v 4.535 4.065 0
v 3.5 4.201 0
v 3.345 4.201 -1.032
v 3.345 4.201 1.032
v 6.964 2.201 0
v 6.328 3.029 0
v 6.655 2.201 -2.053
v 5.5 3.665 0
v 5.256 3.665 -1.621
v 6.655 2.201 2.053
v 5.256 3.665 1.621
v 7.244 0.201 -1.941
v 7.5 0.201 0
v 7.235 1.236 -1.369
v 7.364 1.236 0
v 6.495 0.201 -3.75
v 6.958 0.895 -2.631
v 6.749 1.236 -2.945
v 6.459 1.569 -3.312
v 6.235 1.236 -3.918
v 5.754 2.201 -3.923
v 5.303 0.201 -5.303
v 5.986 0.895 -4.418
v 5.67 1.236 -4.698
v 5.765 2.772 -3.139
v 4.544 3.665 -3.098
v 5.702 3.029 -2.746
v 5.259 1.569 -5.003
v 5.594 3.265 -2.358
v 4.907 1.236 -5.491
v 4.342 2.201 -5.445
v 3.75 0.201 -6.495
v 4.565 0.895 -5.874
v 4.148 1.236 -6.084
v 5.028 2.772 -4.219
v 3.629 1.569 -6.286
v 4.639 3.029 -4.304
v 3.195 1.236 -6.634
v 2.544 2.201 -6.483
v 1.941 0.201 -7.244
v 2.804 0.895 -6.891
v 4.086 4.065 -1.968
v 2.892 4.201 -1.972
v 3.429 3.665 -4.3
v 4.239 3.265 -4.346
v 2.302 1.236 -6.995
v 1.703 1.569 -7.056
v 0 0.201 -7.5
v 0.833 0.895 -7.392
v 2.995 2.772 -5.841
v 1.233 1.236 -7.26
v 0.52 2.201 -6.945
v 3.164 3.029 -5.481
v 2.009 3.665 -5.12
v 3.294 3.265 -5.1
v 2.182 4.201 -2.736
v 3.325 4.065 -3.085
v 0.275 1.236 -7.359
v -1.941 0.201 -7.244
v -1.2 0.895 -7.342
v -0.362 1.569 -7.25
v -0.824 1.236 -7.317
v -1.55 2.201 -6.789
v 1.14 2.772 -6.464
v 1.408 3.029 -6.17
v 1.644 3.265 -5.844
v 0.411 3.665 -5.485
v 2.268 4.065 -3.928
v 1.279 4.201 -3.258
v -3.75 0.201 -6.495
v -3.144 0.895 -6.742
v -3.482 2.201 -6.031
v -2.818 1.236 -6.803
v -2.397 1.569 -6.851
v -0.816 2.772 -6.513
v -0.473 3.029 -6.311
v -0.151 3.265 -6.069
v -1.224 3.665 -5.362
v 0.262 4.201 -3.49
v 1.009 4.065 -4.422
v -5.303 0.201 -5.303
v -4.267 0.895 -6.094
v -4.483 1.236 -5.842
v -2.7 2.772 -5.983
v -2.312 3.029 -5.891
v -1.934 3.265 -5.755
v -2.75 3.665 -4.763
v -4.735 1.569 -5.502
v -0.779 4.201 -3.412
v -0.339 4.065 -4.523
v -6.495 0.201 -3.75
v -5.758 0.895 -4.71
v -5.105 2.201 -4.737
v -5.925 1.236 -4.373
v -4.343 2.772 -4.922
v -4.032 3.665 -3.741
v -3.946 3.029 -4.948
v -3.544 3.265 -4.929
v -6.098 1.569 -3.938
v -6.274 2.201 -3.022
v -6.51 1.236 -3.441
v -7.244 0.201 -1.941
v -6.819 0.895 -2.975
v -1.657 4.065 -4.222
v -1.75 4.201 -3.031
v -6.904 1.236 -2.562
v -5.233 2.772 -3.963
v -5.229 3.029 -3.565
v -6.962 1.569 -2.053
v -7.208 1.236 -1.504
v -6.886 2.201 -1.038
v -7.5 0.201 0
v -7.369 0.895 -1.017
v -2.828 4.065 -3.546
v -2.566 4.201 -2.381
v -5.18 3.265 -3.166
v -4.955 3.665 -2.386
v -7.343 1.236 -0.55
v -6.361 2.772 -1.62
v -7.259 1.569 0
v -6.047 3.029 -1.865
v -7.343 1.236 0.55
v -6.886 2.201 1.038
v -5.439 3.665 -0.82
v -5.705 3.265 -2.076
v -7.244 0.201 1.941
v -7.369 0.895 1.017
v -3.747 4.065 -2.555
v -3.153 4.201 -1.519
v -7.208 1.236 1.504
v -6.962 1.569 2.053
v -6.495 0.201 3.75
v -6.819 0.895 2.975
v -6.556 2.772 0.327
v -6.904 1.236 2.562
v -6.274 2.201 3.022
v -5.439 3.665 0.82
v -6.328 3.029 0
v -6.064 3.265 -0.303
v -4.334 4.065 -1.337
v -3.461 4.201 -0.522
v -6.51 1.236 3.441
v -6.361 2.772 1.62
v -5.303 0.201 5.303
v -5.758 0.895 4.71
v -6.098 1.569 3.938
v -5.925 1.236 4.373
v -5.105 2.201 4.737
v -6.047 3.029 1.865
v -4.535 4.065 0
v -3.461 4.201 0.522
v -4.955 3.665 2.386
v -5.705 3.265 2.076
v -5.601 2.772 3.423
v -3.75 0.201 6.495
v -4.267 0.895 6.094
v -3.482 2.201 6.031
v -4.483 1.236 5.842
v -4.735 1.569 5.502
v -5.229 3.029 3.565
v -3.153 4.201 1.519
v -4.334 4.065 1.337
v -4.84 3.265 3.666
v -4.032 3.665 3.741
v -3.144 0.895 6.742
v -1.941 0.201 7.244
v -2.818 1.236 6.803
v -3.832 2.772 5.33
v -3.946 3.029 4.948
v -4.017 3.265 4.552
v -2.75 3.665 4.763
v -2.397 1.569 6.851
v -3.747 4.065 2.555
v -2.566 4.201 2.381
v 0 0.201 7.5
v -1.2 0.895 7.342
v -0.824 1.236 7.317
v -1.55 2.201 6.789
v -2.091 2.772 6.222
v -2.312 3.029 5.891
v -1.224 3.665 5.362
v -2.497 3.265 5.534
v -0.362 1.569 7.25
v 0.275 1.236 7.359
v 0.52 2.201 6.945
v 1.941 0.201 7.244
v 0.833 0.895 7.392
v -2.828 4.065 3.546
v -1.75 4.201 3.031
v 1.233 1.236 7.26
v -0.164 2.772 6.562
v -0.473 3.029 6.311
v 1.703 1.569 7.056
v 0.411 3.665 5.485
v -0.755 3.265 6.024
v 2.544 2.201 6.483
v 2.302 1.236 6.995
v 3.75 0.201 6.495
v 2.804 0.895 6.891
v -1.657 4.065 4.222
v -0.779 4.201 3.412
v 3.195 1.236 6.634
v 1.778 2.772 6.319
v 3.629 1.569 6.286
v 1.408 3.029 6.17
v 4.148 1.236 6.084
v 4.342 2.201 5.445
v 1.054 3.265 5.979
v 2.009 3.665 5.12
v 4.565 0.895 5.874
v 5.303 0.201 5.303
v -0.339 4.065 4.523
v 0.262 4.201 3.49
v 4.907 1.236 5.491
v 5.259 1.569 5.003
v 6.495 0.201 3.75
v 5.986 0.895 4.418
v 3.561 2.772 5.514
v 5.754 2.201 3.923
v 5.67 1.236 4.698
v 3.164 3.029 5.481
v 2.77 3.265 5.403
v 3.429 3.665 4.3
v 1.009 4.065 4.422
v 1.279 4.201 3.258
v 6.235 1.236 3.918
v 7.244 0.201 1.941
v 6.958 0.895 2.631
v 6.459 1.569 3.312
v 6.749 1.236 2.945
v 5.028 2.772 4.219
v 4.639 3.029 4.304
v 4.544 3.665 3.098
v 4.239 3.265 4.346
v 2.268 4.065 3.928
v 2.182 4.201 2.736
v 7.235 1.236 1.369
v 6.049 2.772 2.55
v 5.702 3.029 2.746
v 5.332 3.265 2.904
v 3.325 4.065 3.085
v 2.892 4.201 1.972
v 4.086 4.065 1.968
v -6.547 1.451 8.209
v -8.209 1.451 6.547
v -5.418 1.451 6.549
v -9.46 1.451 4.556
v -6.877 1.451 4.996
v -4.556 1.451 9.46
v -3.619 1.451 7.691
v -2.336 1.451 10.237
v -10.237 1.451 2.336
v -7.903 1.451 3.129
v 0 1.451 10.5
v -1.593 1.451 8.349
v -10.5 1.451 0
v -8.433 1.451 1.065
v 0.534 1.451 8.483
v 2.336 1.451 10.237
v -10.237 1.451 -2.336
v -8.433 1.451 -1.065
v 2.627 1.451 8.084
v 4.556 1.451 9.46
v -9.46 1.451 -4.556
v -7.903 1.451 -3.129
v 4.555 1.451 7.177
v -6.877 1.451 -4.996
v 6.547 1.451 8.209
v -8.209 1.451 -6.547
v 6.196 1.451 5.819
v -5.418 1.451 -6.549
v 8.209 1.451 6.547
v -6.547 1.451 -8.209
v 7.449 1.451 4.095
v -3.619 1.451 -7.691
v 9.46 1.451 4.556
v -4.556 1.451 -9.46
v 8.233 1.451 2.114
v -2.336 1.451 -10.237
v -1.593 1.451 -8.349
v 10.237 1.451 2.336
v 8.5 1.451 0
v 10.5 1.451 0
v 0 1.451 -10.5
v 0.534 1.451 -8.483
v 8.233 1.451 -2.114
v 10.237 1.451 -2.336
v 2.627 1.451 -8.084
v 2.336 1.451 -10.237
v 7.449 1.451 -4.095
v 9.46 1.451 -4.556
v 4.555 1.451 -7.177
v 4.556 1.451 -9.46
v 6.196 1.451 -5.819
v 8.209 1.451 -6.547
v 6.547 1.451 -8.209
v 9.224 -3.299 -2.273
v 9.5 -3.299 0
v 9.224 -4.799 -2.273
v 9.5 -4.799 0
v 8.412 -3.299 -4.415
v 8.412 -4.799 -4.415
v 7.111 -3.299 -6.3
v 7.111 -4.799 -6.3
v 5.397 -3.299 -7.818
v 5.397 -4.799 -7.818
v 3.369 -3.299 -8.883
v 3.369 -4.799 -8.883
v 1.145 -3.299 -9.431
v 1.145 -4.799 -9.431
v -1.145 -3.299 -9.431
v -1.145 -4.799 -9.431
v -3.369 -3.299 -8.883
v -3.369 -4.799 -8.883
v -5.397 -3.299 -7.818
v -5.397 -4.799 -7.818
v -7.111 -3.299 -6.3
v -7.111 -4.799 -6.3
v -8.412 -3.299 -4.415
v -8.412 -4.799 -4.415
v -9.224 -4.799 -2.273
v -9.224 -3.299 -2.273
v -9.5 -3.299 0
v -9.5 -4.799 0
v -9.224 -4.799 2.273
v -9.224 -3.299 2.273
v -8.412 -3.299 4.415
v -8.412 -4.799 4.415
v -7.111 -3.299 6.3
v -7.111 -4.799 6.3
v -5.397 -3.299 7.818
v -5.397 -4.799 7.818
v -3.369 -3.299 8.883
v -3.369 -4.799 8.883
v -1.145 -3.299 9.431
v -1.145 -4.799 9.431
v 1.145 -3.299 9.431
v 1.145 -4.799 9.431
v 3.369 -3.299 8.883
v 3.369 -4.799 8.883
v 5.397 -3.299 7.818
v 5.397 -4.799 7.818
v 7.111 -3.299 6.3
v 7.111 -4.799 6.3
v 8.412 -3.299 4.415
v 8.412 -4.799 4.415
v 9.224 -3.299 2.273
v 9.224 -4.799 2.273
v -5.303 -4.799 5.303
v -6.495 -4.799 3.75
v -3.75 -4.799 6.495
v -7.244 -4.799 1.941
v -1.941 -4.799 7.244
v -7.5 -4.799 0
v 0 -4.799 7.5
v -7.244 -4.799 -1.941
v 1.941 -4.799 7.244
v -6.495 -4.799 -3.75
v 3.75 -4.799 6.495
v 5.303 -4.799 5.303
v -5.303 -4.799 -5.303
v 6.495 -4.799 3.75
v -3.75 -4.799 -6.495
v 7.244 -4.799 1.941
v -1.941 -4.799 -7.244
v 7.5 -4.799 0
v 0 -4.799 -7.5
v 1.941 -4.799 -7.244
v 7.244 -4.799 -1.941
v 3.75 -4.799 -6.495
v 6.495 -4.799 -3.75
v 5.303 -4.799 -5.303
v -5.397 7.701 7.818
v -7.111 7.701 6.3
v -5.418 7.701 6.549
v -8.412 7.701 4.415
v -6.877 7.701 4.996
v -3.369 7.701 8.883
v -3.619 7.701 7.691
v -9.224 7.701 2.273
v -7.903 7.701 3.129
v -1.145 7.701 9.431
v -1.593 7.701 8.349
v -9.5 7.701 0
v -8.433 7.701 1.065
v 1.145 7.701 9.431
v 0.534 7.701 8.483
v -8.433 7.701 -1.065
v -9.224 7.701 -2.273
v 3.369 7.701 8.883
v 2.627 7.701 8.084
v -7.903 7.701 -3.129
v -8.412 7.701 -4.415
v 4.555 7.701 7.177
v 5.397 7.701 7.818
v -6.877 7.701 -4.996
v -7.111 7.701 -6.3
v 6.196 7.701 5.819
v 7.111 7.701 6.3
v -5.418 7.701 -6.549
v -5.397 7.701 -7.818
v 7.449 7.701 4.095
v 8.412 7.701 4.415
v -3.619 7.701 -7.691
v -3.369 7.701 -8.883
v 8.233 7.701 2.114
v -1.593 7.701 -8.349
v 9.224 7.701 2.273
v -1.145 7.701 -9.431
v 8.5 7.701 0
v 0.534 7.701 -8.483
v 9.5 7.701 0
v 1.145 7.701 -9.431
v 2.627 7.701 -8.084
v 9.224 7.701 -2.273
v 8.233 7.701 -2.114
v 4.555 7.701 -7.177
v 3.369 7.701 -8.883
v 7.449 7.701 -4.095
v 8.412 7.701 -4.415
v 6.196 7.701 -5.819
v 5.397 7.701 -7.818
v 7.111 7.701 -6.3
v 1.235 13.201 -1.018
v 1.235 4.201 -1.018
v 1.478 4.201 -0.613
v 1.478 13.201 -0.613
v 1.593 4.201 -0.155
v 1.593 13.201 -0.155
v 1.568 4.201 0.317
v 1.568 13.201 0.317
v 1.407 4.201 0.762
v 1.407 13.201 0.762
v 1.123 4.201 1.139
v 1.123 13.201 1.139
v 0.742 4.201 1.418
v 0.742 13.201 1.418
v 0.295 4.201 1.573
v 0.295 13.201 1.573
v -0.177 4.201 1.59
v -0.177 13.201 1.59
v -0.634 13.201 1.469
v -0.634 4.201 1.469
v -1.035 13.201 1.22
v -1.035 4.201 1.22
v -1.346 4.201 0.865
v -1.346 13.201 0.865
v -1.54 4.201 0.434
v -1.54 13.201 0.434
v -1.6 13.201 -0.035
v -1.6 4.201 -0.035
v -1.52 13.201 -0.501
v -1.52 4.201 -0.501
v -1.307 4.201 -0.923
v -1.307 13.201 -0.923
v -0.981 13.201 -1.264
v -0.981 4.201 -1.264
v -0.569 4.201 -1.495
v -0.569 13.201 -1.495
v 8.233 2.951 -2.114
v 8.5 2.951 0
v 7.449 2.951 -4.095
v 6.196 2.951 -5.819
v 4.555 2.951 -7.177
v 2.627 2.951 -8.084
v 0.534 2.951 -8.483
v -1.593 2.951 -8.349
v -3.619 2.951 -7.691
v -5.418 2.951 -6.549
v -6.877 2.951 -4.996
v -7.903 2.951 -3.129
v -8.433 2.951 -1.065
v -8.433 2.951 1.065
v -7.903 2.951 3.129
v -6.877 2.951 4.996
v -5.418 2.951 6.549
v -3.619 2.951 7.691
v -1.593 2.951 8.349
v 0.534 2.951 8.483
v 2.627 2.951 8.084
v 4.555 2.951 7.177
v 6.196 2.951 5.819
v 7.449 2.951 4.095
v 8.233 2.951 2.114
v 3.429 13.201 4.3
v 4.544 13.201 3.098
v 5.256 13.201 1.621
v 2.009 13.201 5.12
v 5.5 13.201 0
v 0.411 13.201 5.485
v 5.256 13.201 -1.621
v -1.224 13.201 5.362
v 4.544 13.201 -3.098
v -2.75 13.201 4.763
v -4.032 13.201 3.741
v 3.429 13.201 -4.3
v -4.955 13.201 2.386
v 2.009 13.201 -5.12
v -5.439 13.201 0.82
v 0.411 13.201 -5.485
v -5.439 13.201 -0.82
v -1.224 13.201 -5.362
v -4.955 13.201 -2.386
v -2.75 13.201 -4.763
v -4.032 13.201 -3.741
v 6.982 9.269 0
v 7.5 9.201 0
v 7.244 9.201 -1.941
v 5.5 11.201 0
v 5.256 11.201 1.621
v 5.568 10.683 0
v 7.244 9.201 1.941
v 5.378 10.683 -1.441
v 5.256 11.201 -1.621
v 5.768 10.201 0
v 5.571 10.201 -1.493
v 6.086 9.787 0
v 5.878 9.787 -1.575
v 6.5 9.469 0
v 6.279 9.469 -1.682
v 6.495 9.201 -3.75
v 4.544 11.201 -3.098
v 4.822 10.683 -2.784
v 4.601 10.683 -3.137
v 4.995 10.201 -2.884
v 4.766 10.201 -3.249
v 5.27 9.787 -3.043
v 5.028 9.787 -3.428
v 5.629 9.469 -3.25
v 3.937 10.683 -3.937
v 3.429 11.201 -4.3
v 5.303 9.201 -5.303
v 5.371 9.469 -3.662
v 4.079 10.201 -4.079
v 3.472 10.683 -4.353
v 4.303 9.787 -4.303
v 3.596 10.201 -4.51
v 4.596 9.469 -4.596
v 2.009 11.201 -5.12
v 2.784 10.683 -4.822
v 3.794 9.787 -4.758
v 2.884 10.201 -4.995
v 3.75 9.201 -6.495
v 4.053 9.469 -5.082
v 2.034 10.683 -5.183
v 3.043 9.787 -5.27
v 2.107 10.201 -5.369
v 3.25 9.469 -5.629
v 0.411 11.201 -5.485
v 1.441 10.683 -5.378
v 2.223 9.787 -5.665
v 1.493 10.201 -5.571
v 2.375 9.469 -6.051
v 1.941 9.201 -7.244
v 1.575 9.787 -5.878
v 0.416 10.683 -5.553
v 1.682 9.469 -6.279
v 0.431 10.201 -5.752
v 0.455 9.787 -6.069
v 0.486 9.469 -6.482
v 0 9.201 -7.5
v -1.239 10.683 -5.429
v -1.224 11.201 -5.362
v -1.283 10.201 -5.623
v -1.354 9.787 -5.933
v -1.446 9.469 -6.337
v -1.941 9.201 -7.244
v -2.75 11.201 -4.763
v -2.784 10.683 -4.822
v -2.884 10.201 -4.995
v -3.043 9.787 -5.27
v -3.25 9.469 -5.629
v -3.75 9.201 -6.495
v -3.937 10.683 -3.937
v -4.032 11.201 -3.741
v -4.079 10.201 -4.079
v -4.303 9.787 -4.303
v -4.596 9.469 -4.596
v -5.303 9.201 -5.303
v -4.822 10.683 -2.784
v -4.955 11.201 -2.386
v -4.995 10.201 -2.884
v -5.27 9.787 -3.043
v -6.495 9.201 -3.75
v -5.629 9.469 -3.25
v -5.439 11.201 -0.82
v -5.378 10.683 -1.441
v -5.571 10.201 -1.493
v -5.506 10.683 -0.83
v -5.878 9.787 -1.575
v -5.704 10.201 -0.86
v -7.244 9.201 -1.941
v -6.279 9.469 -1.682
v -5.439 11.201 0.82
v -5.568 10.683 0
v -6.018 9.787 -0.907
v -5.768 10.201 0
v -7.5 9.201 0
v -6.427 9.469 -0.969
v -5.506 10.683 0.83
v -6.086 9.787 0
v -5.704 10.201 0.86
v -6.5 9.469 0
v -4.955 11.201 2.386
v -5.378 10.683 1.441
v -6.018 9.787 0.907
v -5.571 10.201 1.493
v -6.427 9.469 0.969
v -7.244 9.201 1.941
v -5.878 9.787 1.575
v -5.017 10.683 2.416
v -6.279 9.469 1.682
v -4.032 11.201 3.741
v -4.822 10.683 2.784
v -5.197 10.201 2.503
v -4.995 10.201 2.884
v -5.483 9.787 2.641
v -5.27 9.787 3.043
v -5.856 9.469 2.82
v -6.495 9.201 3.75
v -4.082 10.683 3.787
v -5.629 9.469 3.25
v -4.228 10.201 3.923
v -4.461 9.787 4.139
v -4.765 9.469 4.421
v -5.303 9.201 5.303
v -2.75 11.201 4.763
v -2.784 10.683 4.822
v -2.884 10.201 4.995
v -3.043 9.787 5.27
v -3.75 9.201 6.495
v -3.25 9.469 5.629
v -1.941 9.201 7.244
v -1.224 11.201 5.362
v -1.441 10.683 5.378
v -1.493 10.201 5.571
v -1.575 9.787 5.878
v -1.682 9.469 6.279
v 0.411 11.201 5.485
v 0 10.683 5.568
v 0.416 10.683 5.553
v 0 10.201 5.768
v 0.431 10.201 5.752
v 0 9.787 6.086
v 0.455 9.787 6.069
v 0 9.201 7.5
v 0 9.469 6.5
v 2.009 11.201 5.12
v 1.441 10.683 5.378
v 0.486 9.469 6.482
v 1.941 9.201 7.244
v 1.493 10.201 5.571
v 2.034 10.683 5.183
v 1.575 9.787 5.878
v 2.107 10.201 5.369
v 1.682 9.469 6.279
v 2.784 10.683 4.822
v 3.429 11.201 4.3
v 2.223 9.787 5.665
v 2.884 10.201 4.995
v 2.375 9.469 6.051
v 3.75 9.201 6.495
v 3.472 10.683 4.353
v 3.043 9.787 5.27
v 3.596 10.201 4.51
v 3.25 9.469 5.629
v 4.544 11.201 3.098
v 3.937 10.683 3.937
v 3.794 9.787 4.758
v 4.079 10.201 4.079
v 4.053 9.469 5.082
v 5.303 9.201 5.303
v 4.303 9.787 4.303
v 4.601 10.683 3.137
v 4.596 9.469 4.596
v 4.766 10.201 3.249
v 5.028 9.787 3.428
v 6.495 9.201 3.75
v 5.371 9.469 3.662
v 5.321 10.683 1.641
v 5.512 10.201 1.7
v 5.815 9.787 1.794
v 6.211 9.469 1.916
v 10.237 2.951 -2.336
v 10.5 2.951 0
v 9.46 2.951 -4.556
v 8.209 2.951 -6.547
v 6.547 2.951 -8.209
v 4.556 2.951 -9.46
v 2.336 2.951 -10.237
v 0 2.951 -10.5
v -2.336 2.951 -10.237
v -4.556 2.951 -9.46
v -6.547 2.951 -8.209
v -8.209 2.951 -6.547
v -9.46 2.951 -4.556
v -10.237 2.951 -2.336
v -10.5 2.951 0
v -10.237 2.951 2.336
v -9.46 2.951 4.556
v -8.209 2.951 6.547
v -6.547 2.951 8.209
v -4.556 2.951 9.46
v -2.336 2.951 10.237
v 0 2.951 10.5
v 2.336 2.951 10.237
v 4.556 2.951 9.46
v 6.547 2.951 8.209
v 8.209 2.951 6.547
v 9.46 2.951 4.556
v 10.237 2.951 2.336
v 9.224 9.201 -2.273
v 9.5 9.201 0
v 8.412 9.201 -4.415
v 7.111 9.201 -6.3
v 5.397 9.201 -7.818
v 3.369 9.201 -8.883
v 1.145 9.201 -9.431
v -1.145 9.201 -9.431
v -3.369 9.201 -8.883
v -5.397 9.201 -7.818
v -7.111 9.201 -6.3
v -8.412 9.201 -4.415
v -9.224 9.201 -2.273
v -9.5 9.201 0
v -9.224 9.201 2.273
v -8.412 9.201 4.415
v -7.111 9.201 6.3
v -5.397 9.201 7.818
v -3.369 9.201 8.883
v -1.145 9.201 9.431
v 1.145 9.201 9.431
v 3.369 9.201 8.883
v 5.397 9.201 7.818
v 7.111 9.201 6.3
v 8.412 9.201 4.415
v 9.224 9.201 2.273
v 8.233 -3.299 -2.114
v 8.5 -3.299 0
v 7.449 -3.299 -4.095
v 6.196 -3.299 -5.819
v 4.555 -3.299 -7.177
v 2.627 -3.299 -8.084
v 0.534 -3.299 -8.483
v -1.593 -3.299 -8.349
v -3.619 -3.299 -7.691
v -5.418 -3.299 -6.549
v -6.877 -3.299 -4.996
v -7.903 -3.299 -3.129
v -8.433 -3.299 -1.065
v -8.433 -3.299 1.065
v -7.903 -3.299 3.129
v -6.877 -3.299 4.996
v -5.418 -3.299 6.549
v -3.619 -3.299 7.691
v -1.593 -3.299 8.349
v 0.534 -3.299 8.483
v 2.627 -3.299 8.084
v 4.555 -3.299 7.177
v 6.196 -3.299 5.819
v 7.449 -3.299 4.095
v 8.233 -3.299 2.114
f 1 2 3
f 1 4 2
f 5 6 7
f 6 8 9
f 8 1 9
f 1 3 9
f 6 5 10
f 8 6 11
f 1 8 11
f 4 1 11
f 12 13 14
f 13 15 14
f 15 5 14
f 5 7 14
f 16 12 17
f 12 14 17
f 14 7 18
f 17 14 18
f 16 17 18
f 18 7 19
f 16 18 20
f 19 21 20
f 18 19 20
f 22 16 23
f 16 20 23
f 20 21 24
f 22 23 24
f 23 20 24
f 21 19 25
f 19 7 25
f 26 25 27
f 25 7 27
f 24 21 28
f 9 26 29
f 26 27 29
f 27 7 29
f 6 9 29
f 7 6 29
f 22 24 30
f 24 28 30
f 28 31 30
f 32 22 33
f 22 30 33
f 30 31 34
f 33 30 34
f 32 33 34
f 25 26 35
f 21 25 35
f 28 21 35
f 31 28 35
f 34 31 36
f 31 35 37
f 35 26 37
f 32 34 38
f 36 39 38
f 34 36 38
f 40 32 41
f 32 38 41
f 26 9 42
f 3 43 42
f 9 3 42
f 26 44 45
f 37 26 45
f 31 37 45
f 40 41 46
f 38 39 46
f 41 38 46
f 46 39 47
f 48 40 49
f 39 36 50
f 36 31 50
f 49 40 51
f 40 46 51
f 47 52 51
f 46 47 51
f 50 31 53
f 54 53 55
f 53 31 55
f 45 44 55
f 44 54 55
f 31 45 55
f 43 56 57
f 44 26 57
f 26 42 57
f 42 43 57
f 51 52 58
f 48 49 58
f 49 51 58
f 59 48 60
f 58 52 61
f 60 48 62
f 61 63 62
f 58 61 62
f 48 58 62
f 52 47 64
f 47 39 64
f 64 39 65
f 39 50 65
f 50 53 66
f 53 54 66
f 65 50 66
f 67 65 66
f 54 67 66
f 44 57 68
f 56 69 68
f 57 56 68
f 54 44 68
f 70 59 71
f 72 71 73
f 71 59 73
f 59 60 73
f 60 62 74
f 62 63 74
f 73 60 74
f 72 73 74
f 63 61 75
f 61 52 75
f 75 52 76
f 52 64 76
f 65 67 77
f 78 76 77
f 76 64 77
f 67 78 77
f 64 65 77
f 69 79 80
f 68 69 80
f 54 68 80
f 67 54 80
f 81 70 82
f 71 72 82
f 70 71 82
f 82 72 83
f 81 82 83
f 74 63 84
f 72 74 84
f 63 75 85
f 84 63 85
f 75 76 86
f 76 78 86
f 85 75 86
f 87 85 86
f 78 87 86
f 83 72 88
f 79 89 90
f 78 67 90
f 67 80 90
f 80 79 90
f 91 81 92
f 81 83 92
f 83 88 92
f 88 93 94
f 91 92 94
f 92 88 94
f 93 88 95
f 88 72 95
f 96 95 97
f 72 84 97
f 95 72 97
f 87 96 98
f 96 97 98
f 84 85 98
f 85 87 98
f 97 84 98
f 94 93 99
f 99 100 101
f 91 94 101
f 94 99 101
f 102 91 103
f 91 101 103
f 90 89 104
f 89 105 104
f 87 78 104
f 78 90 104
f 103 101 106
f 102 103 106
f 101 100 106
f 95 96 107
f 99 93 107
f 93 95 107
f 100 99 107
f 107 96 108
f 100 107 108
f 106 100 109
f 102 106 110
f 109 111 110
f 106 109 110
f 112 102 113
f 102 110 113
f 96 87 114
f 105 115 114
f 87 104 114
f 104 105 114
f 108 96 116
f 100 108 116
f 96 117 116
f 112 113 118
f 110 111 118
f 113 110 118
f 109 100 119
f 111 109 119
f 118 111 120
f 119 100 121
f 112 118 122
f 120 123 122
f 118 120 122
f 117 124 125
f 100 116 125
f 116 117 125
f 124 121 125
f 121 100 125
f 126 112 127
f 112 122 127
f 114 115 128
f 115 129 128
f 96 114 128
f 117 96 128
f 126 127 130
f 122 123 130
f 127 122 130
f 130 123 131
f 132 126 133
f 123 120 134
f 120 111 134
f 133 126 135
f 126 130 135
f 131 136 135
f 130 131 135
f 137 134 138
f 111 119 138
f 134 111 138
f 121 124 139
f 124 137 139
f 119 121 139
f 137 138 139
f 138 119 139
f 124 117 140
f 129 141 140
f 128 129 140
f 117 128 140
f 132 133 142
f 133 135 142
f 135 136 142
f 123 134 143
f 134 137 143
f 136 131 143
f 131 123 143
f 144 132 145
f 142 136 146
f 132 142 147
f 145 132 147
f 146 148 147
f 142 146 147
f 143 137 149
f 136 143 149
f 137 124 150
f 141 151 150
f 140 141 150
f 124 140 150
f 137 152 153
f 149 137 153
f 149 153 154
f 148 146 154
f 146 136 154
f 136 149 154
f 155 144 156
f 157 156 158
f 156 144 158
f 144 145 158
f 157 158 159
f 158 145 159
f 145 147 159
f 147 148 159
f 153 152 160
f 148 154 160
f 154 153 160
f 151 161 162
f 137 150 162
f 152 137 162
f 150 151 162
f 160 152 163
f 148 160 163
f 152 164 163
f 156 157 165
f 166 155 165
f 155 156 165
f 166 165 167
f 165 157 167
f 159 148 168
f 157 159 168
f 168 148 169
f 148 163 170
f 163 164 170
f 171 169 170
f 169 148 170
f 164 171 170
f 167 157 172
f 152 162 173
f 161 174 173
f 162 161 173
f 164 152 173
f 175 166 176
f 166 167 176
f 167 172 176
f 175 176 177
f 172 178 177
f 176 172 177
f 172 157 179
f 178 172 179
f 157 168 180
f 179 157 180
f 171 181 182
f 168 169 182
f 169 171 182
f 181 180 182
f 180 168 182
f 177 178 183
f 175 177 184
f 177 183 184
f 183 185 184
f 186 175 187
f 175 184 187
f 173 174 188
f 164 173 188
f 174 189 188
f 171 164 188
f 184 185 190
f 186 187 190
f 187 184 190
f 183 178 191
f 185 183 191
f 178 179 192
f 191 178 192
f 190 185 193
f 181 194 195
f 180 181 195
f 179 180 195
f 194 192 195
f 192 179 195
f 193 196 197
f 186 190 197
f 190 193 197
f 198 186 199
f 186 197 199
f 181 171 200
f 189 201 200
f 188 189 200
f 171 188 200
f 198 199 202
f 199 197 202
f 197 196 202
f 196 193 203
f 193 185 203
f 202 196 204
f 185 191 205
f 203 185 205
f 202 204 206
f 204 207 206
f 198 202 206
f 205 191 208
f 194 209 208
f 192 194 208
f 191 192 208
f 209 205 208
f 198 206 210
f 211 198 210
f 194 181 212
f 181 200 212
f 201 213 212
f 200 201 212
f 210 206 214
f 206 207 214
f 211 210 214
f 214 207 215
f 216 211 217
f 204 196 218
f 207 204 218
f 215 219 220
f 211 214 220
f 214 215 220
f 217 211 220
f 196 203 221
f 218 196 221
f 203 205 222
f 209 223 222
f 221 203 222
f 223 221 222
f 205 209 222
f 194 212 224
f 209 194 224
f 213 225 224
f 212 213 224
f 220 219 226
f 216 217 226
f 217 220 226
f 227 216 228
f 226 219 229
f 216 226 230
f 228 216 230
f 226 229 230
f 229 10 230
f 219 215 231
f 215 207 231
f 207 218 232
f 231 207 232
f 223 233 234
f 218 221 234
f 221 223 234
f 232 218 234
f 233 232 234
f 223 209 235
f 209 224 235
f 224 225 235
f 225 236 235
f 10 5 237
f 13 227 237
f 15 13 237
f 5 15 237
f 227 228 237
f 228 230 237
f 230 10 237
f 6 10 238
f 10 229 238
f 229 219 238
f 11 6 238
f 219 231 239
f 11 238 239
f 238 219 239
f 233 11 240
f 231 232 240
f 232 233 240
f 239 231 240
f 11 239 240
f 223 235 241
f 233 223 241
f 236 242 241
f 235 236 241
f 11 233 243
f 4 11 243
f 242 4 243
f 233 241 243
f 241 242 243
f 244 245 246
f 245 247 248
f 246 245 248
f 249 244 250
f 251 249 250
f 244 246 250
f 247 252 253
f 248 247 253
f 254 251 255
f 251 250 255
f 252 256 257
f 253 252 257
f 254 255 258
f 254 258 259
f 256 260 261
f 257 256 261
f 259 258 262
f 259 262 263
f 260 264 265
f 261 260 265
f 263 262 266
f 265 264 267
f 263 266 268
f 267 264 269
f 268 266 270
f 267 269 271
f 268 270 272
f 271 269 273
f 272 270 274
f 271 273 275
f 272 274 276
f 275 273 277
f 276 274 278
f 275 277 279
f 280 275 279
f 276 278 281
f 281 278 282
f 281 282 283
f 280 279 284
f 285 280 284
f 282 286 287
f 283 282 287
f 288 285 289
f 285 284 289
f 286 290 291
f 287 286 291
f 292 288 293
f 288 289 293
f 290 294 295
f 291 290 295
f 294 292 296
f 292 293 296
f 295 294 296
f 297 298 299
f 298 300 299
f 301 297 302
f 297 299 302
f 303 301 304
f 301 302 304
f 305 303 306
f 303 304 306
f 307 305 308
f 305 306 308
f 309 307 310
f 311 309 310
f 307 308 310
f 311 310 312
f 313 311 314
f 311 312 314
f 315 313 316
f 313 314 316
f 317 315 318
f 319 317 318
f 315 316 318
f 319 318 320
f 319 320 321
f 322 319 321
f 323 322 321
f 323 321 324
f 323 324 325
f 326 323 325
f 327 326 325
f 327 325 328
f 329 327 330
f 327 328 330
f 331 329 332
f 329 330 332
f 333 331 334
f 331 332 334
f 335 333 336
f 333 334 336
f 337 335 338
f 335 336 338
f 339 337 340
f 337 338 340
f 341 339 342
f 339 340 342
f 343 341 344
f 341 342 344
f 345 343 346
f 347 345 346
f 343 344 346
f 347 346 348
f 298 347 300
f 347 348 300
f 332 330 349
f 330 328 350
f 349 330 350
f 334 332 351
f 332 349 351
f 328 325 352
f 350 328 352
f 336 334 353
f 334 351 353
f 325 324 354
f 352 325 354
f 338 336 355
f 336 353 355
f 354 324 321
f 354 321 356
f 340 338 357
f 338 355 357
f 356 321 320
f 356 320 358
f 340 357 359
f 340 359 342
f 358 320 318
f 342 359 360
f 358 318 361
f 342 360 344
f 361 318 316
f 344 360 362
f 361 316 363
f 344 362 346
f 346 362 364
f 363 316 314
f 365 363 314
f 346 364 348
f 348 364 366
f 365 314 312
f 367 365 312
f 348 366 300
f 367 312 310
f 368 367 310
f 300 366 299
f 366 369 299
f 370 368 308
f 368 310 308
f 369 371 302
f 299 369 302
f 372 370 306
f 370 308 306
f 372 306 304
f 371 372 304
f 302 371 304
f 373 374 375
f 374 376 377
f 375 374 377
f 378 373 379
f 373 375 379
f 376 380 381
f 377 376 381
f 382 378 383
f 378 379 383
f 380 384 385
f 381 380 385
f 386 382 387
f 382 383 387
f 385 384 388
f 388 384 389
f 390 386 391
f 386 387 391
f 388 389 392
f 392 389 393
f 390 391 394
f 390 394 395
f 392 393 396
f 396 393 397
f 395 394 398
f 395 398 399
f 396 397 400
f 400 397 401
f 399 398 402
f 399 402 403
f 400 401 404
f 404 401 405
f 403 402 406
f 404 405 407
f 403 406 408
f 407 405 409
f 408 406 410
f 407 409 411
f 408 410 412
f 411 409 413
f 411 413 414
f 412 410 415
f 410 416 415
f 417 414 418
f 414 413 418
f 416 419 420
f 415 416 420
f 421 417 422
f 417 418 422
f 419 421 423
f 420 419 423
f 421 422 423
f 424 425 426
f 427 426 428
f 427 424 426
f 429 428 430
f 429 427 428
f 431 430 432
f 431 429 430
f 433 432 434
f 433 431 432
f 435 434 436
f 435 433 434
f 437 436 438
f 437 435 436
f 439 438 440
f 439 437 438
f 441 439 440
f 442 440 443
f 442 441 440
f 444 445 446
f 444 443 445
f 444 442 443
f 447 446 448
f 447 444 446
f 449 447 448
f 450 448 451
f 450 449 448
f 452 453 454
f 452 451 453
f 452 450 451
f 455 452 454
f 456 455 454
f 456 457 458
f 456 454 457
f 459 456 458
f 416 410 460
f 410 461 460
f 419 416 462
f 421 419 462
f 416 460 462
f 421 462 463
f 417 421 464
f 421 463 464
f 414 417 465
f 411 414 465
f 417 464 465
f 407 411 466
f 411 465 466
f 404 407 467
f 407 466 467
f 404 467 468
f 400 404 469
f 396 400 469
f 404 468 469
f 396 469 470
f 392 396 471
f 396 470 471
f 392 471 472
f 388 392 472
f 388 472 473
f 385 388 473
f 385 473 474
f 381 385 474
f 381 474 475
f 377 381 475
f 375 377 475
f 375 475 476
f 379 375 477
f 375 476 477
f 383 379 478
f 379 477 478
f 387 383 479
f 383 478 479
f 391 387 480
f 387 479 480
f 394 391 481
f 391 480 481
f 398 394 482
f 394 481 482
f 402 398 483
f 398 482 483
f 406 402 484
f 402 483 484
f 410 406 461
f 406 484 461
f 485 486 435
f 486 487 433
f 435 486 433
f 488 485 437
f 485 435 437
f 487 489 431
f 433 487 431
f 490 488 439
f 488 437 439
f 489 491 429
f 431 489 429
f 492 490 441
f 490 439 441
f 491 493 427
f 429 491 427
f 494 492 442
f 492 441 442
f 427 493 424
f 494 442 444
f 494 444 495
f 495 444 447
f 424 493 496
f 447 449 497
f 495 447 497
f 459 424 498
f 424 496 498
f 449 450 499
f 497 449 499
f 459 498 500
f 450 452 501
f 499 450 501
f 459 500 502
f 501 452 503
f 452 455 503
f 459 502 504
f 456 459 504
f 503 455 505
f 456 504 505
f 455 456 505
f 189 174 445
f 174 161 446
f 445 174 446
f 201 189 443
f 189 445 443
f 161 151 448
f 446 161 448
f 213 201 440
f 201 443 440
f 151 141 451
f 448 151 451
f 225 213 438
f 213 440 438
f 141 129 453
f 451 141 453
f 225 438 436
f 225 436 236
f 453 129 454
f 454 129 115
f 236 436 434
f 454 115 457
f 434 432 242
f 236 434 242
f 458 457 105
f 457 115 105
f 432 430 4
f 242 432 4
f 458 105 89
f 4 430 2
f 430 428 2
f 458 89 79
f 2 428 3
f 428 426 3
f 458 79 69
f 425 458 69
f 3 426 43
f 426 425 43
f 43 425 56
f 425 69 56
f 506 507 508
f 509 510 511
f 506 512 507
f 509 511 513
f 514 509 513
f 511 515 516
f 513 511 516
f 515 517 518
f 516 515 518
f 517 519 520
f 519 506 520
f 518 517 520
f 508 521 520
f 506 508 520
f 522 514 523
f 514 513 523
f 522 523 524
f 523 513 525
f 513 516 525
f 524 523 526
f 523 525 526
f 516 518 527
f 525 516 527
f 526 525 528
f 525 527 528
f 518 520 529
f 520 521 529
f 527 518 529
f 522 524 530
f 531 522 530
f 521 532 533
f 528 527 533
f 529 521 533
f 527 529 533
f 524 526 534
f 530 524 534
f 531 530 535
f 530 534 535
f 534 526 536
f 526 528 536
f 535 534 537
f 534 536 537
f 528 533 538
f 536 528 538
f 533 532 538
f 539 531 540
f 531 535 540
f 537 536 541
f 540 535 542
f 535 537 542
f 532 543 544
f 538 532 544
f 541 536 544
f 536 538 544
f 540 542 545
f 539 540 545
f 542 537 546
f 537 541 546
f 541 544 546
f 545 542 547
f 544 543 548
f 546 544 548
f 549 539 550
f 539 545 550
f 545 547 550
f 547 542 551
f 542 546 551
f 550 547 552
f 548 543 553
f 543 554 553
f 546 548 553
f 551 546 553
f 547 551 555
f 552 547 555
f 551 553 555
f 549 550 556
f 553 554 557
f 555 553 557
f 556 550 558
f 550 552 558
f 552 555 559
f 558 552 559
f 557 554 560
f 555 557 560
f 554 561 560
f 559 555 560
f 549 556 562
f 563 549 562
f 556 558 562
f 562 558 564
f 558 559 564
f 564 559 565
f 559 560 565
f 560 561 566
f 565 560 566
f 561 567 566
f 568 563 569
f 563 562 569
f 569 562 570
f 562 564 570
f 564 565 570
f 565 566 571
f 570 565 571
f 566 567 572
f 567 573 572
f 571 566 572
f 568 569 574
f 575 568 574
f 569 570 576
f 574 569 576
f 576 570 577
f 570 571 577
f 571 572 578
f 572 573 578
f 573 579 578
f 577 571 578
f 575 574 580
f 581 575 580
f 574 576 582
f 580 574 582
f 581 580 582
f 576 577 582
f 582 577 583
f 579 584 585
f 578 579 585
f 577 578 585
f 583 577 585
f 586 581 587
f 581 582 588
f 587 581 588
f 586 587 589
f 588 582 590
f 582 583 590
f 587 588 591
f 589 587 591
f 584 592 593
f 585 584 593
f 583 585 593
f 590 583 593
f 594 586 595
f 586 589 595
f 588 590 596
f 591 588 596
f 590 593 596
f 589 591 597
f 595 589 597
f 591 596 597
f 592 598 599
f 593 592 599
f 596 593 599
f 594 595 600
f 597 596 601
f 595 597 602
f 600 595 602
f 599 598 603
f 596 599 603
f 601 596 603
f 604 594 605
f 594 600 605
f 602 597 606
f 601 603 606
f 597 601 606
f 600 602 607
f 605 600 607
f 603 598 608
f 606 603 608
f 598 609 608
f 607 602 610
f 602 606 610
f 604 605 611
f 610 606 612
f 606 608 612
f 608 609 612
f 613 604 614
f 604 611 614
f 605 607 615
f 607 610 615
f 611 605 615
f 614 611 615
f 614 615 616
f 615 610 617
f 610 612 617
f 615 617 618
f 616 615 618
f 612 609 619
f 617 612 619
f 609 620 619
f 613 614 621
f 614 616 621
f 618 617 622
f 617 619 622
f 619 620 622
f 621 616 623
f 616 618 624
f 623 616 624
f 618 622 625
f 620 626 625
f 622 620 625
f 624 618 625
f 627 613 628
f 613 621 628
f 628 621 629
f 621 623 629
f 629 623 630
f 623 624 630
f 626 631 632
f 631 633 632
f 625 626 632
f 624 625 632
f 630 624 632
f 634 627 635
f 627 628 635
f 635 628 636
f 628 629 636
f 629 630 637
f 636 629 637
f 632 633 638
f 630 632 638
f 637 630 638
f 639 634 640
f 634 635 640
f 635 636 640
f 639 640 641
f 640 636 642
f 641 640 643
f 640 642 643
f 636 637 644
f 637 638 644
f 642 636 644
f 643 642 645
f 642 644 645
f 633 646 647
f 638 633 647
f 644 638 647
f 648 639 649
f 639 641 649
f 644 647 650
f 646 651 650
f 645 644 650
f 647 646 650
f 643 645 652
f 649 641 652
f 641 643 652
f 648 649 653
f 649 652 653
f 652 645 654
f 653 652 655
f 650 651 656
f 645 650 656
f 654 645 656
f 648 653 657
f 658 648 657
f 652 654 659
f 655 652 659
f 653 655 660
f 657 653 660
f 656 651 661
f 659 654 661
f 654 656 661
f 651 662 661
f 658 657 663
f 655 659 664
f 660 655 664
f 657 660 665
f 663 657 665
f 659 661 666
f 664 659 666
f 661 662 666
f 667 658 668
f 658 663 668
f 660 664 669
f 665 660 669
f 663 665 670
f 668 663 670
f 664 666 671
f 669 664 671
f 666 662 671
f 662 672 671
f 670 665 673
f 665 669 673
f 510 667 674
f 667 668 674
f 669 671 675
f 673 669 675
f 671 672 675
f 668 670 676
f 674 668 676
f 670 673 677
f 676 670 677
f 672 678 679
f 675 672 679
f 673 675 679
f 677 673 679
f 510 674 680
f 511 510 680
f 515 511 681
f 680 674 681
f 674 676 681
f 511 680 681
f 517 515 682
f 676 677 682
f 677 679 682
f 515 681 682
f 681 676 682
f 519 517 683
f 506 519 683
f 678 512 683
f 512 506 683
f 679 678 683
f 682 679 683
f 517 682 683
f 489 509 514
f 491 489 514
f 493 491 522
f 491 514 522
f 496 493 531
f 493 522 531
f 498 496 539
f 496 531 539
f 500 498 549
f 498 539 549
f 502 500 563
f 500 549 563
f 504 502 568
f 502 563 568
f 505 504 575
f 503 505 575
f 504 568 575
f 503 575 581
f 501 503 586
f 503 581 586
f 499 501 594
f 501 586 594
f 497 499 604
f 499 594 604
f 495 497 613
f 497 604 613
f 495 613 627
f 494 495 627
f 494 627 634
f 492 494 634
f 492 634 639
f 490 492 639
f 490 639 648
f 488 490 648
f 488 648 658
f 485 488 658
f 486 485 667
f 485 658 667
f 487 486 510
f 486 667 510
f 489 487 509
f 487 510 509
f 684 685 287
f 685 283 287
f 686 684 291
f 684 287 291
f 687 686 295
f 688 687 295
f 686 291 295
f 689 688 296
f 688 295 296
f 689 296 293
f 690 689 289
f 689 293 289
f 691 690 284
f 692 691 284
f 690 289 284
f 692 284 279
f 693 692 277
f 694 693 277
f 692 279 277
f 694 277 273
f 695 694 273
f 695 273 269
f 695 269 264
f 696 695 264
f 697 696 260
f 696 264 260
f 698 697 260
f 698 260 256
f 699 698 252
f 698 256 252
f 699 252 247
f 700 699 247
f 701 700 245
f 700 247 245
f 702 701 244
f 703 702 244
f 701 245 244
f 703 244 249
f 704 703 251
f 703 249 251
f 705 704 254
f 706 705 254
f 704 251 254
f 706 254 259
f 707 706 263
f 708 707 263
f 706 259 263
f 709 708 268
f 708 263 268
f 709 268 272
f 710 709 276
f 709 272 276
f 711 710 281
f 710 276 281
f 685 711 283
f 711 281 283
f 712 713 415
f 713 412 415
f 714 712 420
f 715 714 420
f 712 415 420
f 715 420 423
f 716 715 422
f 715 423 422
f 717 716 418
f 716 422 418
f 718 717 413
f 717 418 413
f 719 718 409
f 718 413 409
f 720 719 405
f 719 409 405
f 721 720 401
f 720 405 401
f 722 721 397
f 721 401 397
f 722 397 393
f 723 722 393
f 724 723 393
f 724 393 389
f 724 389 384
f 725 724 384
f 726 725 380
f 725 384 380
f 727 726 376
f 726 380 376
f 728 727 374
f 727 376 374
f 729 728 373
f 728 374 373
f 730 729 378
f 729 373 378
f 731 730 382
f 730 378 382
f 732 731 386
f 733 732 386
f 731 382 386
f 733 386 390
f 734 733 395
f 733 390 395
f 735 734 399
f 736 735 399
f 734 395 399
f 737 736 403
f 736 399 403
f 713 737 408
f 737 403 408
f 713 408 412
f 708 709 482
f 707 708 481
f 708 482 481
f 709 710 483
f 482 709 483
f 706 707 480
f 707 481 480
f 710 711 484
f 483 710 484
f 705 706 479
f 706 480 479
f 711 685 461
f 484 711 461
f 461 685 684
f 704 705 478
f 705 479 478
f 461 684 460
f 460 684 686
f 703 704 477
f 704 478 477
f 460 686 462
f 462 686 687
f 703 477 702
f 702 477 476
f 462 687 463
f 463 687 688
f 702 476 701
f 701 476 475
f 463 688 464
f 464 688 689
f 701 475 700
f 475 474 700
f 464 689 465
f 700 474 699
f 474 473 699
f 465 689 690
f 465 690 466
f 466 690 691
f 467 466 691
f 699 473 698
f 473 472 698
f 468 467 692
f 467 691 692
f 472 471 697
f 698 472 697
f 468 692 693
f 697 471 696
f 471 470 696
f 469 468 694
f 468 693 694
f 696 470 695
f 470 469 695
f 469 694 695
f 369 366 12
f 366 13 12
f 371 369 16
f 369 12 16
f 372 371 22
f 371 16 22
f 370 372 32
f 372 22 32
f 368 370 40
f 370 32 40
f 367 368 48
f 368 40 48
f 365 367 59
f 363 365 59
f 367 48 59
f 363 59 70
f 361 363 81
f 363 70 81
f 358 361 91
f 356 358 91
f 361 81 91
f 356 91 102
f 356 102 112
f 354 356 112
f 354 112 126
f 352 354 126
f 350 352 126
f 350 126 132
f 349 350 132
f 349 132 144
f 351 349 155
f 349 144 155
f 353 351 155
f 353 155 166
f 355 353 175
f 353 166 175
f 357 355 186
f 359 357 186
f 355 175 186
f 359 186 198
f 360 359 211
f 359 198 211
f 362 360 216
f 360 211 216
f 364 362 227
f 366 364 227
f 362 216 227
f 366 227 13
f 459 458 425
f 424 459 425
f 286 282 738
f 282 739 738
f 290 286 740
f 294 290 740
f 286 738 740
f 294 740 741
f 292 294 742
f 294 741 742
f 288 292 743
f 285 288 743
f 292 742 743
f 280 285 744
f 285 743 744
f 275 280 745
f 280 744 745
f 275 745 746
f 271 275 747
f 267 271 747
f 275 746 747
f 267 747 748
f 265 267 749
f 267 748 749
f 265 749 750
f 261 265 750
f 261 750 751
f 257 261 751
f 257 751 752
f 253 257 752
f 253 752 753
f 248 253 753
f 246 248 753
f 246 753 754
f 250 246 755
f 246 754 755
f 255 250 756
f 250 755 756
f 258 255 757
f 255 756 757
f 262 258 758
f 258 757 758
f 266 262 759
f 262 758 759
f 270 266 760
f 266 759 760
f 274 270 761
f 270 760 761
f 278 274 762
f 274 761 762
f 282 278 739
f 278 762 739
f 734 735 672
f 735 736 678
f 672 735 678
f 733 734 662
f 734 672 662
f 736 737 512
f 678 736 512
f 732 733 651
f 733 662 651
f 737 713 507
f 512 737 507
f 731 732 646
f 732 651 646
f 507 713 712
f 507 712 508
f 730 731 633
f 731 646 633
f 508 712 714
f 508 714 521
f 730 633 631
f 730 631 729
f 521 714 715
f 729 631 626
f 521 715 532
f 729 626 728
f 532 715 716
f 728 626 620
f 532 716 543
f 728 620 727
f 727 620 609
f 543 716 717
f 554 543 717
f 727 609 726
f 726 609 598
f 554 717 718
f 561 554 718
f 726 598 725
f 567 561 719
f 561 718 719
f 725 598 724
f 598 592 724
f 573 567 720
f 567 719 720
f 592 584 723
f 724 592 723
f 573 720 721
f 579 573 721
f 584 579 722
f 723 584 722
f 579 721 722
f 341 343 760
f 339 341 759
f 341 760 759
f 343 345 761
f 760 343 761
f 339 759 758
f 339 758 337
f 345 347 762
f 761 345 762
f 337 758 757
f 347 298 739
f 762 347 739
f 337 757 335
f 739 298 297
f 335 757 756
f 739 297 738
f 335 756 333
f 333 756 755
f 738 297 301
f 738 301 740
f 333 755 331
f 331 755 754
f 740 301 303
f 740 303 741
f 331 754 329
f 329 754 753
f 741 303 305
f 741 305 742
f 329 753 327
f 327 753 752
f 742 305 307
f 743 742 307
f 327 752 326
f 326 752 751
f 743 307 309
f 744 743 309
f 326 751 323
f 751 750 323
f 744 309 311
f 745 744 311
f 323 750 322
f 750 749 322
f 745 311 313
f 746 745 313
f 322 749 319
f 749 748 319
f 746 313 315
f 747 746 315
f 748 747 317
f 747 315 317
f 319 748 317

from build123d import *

# Parameters (mm, degrees)
ZAOKR_GLENIE1_R            = 2
WYTNIJ_WYCI_GNI_CIE1_DEPTH = 19


with BuildPart() as part:
    # Szkic1 → Obrót1 (revolve)
    with BuildSketch(Plane.XY):
        with BuildLine():
            Line((7.5, -4.799176992), (7.5, 0.200823008))
            ThreePointArc((7.5, 0.200823008), (6.328427125, 3.029250132), (3.5, 4.200823008))
            Line((3.5, 4.200823008), (0, 4.200823008))
            Line((0, 4.200823008), (0, 13.200823008))
            Line((0, 13.200823008), (5.5, 13.200823008))
            Line((5.5, 13.200823008), (5.5, 9.200823008))
            Line((5.5, 9.200823008), (9.5, 9.200823008))
            Line((9.5, 9.200823008), (9.5, 7.700823008))
            Line((9.5, 7.700823008), (8.5, 7.700823008))
            Line((8.5, 7.700823008), (8.5, 2.950823008))
            Line((8.5, 2.950823008), (10.5, 2.950823008))
            Line((10.5, 2.950823008), (10.5, 1.450823008))
            Line((10.5, 1.450823008), (8.5, 1.450823008))
            Line((8.5, 1.450823008), (8.5, -3.299176992))
            Line((8.5, -3.299176992), (9.5, -3.299176992))
            Line((9.5, -3.299176992), (9.5, -4.799176992))
            Line((9.5, -4.799176992), (7.5, -4.799176992))
        make_face()
    revolve(axis=Axis((0, -15.783107462, 0), (0, 1, 0)))

    # Zaokrąglenie1
    zaokr_glenie1_edges = [part.edges().sort_by_distance(p)[0] for p in [
        (-5.5, 9.200823008, 0),
    ]]
    fillet(zaokr_glenie1_edges, radius=ZAOKR_GLENIE1_R)

    # Szkic2 → Wytnij-wyciągnięcie1 (cut, through all)
    with BuildSketch(Plane(origin=(0, 13.200823008, 0), x_dir=(1, 0, 0), z_dir=(0, 1, 0))):
        with BuildLine():
            Line((-0.568761348, 1.49549675), (1.234520551, 1.017820716))
            ThreePointArc((1.234520551, 1.017820716), (-0.409697971, -1.546656902), (-0.568761348, 1.49549675))
        make_face()
    extrude(amount=-WYTNIJ_WYCI_GNI_CIE1_DEPTH, mode=Mode.SUBTRACT)


solid = part.part
